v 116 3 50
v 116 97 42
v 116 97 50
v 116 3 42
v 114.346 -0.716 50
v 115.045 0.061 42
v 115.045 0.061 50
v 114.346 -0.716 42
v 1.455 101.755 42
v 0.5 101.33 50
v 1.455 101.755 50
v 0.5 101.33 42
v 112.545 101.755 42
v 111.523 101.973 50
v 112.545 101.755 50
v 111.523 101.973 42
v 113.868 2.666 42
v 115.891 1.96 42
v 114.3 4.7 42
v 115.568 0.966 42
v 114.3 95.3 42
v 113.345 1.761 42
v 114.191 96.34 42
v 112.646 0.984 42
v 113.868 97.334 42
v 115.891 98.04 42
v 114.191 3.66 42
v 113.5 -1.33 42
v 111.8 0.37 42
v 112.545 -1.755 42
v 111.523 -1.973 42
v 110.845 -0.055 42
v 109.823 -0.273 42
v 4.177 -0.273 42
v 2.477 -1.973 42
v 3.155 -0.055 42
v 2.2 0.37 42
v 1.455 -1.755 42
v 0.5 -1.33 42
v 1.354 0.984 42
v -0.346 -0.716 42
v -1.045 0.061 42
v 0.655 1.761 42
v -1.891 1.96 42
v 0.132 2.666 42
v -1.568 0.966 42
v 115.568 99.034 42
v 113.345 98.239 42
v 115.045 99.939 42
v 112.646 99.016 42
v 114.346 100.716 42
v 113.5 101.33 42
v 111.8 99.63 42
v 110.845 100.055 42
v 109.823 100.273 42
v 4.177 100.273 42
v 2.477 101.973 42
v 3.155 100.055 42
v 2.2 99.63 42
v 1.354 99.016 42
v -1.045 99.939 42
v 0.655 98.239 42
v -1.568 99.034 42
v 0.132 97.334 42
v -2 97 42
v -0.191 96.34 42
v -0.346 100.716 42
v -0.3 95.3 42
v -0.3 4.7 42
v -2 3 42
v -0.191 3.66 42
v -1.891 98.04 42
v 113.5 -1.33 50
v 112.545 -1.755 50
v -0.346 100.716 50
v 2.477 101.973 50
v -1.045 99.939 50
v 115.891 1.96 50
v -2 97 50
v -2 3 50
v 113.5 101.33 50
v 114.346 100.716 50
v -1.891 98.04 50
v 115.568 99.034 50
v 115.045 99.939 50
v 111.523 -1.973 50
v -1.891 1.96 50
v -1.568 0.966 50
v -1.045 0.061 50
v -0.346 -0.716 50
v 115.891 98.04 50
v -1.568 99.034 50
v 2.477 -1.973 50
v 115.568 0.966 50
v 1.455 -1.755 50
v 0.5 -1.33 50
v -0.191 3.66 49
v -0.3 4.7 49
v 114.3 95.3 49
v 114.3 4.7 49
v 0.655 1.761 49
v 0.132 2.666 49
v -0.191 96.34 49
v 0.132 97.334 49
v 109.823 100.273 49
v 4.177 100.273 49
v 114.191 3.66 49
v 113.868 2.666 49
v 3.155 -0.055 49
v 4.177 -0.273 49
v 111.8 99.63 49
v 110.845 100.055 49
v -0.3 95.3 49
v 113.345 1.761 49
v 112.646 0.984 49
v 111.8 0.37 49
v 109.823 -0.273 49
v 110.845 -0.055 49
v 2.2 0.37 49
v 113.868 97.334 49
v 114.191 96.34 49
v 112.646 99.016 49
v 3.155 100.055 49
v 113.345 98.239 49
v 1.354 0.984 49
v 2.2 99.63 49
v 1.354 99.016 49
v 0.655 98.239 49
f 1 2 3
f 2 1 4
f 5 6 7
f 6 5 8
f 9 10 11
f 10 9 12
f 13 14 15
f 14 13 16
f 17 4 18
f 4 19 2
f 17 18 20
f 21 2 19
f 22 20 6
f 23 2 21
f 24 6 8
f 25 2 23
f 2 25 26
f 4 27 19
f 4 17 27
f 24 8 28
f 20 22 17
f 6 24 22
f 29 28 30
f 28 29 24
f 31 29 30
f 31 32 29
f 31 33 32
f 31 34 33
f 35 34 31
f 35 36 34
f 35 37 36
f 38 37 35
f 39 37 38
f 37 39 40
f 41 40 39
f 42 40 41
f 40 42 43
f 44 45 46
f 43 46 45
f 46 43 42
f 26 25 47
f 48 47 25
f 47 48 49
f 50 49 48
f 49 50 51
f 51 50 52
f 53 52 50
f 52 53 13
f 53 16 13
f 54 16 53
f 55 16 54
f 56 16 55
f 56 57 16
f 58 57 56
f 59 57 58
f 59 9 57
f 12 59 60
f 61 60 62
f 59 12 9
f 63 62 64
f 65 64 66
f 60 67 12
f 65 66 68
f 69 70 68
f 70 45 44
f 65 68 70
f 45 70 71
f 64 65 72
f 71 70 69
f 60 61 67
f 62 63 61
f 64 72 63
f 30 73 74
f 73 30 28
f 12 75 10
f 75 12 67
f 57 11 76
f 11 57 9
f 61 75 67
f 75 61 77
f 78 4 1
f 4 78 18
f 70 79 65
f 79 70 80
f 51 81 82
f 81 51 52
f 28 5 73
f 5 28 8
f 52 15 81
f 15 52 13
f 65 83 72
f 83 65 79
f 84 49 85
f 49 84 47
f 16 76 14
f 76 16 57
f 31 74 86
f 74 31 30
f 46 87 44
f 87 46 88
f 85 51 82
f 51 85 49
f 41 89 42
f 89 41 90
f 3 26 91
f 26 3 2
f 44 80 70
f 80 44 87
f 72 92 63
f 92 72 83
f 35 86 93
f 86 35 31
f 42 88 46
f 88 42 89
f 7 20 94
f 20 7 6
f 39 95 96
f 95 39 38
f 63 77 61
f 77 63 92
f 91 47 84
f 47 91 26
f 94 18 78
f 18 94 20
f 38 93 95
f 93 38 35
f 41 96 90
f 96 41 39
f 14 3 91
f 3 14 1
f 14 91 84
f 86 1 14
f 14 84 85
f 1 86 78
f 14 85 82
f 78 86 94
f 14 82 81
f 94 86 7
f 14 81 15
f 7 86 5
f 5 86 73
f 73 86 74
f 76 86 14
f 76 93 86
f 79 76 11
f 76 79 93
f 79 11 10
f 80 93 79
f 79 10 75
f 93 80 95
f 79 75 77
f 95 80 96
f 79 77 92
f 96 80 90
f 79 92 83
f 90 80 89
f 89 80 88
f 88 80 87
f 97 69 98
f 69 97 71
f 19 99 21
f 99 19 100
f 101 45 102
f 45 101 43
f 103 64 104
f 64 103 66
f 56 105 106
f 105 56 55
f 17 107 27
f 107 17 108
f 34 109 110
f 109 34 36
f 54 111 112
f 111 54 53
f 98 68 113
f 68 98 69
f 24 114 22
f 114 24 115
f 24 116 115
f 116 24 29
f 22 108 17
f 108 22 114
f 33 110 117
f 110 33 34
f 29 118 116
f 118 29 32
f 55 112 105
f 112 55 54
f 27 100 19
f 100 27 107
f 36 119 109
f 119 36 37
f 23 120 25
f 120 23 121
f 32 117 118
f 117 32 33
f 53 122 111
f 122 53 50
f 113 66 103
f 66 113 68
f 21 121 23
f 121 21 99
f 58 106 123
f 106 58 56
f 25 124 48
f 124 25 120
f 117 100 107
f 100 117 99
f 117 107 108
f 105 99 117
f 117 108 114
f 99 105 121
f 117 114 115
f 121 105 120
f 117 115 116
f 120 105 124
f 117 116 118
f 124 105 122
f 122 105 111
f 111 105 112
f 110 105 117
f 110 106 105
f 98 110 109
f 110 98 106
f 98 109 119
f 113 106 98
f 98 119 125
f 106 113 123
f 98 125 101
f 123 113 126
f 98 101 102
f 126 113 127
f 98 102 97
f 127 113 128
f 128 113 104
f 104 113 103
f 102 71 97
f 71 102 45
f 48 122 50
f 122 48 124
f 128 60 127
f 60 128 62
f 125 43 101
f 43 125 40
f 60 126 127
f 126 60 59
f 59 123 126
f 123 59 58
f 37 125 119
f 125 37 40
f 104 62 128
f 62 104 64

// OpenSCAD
boxWidth = 114;
boxDepth = 100;
boxHeight = 40;
//boxHeight = 5;
standOffHeight = 8;
$fn = 20;

// Normal offset is center. Use this
// to push the box left/right/up/down
pcbXOffsetInBox = -0;
pcbYOffsetInBox = 2;

pcbWidth = 100;
pcbHeight = 90;
pcbMountOffset = 5; // m55 in from top/bottom for the PCB mounting hole

pcbOffsetX = ((boxWidth - pcbWidth) /2) + pcbXOffsetInBox; // 7.5mm
pcbOffsetY = ((boxDepth - pcbHeight) /2) + pcbYOffsetInBox;  // 15mm

switchDiameter = 17.5; 
switchX = (boxWidth/4) *3;
switchY = boxHeight - 15;

// Mounting. Tabs/Holes?
includeTabs = true;
includeHoles = false;
includeMountingPosts = false;

// Which part to build?
showBox = false;
showLid = true;
includeSwitchHole = false;

// Debugging
showPcb = false;
showSwitch = false;


// -----------------------------------------
// -----------------------------------------
module GenericBase(xDistance, yDistance, zHeight) {
	// roundedBox([xDistance, yDistance, zHeight], 2, true);

	// Create a rectangluar base to work from that
	// is xDistance by yDistance and zHeight height.

	// This is effectivly a cube with rounded corners

	// extend the base out by 3.5 from holes by using minkowski
	// which gives rounded corners to the board in the process
	// matching the Gadgeteer design
	
	$fn=30;
	radius = 5; //bezelSize;
	translate([radius,radius,0]) {
		minkowski()
		{
			// 3D Minkowski sum all dimensions will be the sum of the two object's dimensions
			cube([xDistance-(radius*2), yDistance-(radius*2), zHeight /2]);
			cylinder(r=radius,h=zHeight/2);
		}
	}
}

module OuterBox() {
    difference() {
        union() {
            GenericBase(boxWidth,boxDepth,boxHeight);
        }
        union() {
            translate([2,2,2]) {
                GenericBase(boxWidth - 4,boxDepth-4,boxHeight);
            }
            
            //translate([boxWidth /2,boxDepth/2,0]) {
            /*
            // Through hold
            translate([boxWidth /2,boxDepth-15,0]) {
                cylinder(d=15, h=3);
            }
            */
            
            // Drill out the mounting holes
            if (includeHoles) {
                MountingHoles();
            }
            
            if (includeSwitchHole) {
                SwitchHole();
            }
            
            cableExitHoles();
            
            usbConnectorHole();
            
            powerConnectorHole();
        }
    }
}

module cableExitHole(width) {
    #cube([width, 10,20]);
    translate([ (width/2), 10, 0]) {
        rotate([90,0,0]) {
            #cylinder(d=width, h=10);
        }
    }
}

module powerConnectorHole() {   
    
    translate([pcbOffsetX + 9.5, boxDepth-4,  standOffHeight+1]) {    
        #cube([16,7, 11]);
    }
}

// This may need supports.
module usbConnectorHole() {
    translate([boxWidth-4, pcbOffsetY + 36,  standOffHeight]) {    
        #cube([8,18, 8 + 3]);
    }
}

// Cut out holes in the wall for the light cables
// to exit.
module cableExitHoles() {
    
    translate([pcbOffsetX, boxDepth -4,  boxHeight-12]) {    
        // Channel 1
        translate([20.5, 0, 0]) {
            cableExitHole(5.2);
        }
        
        // Channel 2
        translate([37, 0, 0]) {
            cableExitHole(5.2);
        }
        
        // Channel 3
        translate([52.7, 0, 0]) {
            cableExitHole(5.2);
        }
        
        // Channel 4
        translate([65, 0, 0]) {
            cableExitHole(5.2);
        }
        
        // NeoPixels
        translate([76.7, 0, 0]) {
            cableExitHole(5.2);
        }
    }   
}

module PcbMounts() {
    
    // Mount holes @5,5 in corners of PCV        
    PcbMount(pcbOffsetX + pcbMountOffset, pcbOffsetY + pcbMountOffset);
    PcbMount(pcbOffsetX + pcbMountOffset, pcbOffsetY + pcbHeight - pcbMountOffset);
    PcbMount(pcbOffsetX + pcbWidth - pcbMountOffset, pcbOffsetY + pcbMountOffset);
    PcbMount(pcbOffsetX + pcbWidth - pcbMountOffset, pcbOffsetY + pcbHeight - pcbMountOffset);
}

module PcbMount(x,y) {
mountSize = 8;
mountHoleSize = 4.5;
    
    translate([x,y,0]) {
        // Outer pad + inner hole (Not all the way through!)
        difference() {
            union() {
                cylinder(d=mountSize, h=standOffHeight);
            }
            union() {
                translate([0,0,2]) {
                    #cylinder(d=mountHoleSize, h=standOffHeight-2);
                }
            }
        }
    }
}

module LidPosts() {
    LidPost(0,0);
    LidPost(boxWidth-(2*5),0);
    LidPost(0,boxDepth-(2*5));
    LidPost(boxWidth-(2*5),boxDepth-(2*5));
}

module LidPost(x,y) {
    mountSize = 7;
    mountHoleSize = 3; //M3 hole
    lidDepth = 0;

    translate([x + 5,y + 5,0]) {
        // Outer pad + inner hole (Not all the way through!)
        difference() {
            union() {
                cylinder(d=mountSize, h=boxHeight - lidDepth);
            }
            union() {
                // 10mm hole from top only
                translate([0,0,boxHeight - lidDepth - 10]) {
                    #cylinder(d=mountHoleSize, h=10);
                }
            }
        }
    }
}

module MountingHoles() {
    offsetFromCorner = 30;
    MountingHole(offsetFromCorner,offsetFromCorner);
    MountingHole(boxWidth-offsetFromCorner,offsetFromCorner);
    MountingHole(offsetFromCorner,boxDepth-offsetFromCorner);
    MountingHole(boxWidth-offsetFromCorner,boxDepth - offsetFromCorner);
}

module MountingHole(x,y) {
    translate([x,y,0]) {
        #cylinder(d=4, h=2);
    }
}

module MountingTabs() {
    
    tabOffset = 15;
    tabWidth = 12;
    tabLength = 8;
    
    MountingTab(0, tabOffset, tabWidth, tabLength);
    MountingTab(0, boxDepth - tabOffset - tabWidth, tabWidth, tabLength);
    
    translate([boxWidth,boxDepth,0]) {
        rotate([0,0,180]) {
            MountingTab(0,15, tabWidth, tabLength);
            MountingTab(0, boxDepth - tabOffset - tabWidth, tabWidth, tabLength);
        }
    }
}

module MountingTab(x,y, tabWidth, tabLength, tabThickness = 2) {
    
    translate([x - tabLength,y ,0]) {
        
        
        difference() {
            union() {
                cube([tabLength,tabWidth,tabThickness]);
                
                translate([0,(tabWidth/2) ,0]) {
                    cylinder(d=tabWidth, h=tabThickness);
                }
            }
            union() {
                // Hole for screw
                translate([0,(tabWidth/2) ,0]) {
                    cylinder(d=4, h=4);
                }
            }
        }
    }
}

module SwitchHole() {
        
    rotate([90,0,0]) {
        translate([switchX,switchY,-3]) {
            #cylinder(d=switchDiameter, h=5);
        }
    }
}

module ShowPcb(x,y) {
    
    color("purple") {
        translate([x,y,standOffHeight]) {
            
            difference() {
                union() {
                    GenericBase(pcbWidth,pcbHeight,1.6);
                    
                    // Add on the Photon
                    translate([7.5, 10.2, 0]) {
                        cube([37,21, 15.5]);
                        
                        // TODO: Add projection for plug.
                    }
                    
                    // Add on the USB connector.
                    translate([89.6, 37.6, 0]) {
                        cube([14,15, 9.5]);
                        
                        // Add projection for plug.
                        translate([16, 0, 0]) {
                            cube([14,15, 9.5]);
                        }
                    }
                    
                    // Add on the socket for the main DC input
                    translate([11.4, 82.7, 1.6]) {
                        cube([12,14.6, 8.5]);
                        
                        // TODO: Add projection for plug.
                        
                        translate([0, 16,1.6]) {
                            cube([12,25, 6]);
                        }
                    }
                    
                    // Add on the 7805
                    translate([95.5, 68, 0]) {
                        cube([8.5,10, 19]);
                    }
                    // ?? Heatsink for 7805?
                    
                    // Add sensor connectors
                    // Switch
                    translate([22, 0, 0]) {
                        cube([8, 6,18]);
                    }
                    
                    // PIR
                    translate([2, 32, 0]) {
                        cube([6, 8,18]);
                    }
                    
                    // Light
                    translate([2, 43, 0]) {
                        cube([6, 8,18]);
                    }
                    
                    // Temperature
                    translate([2, 56.5, 0]) {
                        cube([6, 8,18]);
                    }
                    
                    // Add light connectors
                    // Channel 1
                    translate([20.5, 59, 0]) {
                        cube([5.2, 19.8,18]);
                    }
                    
                    // Channel 2
                    translate([37, 59, 0]) {
                        cube([5.2, 19.8,18]);
                    }
                    
                    // Channel 3
                    translate([52.7, 59, 0]) {
                        cube([5.2, 19.8,18]);
                    }
                    
                    // Channel 4
                    translate([65, 71.5, 0]) {
                        cube([5.2, 6,18]);
                    }
                    
                    // NeoPixels
                    translate([76.7, 71.5, 0]) {
                        cube([7.6, 6, 18]);
                    }
                    
                    // NeoPixels capacitor
                    translate([80, 62.5, 0]) {
                        cylinder(d=10, h=19);
                    }
                }
                union() {
                    // Project the holes 8mm down to show the thread
                    // and 4mm.
                    translate([0,0,-8]) {
                        // Show holes for the PCB mounts
                        translate([5,5,0]) #cylinder(d=3, h=12);
                        translate([pcbWidth-5,5,0]) #cylinder(d=3, h=12);
                        translate([5,pcbHeight-5,0]) #cylinder(d=3, h=12);
                        translate([pcbWidth-5,pcbHeight-5,0]) #cylinder(d=3, h=12);
                    }
                }
            }
        }
    }
}

// Lid
module Lid() {
    
lidToCaseGap = 0.3;
    
    // 2mm overlap.
    translate([-2,-2,0]) { 
        difference() {
            union() {
                GenericBase(boxWidth+4,boxDepth+4,8);
                
                //translate([2.1,2.1,-6]) {
                    //GenericBase(boxWidth - 4.2,boxDepth-4.2,8);
                //}
            }
            union() {
                //LidHoles();
                
                translate([2-lidToCaseGap,2-lidToCaseGap,0]) {
                    // 0.5mm gap all around.
                    #GenericBase(boxWidth + (2*lidToCaseGap), boxDepth+(2*lidToCaseGap),7);
                }
            }
        }
    }
}

module LidHoles() {
    LidHole(0,0);
    LidHole(boxWidth-(2*5),0);
    LidHole(0,boxDepth-(2*5));
    LidHole(boxWidth-(2*5),boxDepth-(2*5));
}

module LidHole(x,y) {
    mountSize = 7;
    mountHoleSize = 3; //M3 hole
    lidDepth = 0;

    // 10mm cut 
    translate([x + 5,y + 5,-8]) {
        cylinder(d=mountSize+4, h=8);
    }
    
    translate([x + 5,y + 5,-10]) {
        cylinder(d=mountHoleSize+2, h=20);
    }
            
}

if (showBox) {
    OuterBox();
    PcbMounts();
    
    if (includeMountingPosts) {
        LidPosts();
    }
    
    if (includeTabs) {
        MountingTabs();
    }
}

if (showPcb) {
    // Debug help.
    ShowPcb(pcbOffsetX,pcbOffsetY);
}

if (showSwitch) {
    rotate([90,0,0]) {
        
        // Switch outer.
        translate([switchX,switchY,0]) {
            cylinder(d=18, h=3);
        }
        
        // Approx switch body length = 38mm;
        translate([switchX,switchY,-38]) {
            cylinder(d=16.5, h=38);
        }
    }
}

if (showLid) {
    translate([0,0,42]) {
        Lid();
    }
}
